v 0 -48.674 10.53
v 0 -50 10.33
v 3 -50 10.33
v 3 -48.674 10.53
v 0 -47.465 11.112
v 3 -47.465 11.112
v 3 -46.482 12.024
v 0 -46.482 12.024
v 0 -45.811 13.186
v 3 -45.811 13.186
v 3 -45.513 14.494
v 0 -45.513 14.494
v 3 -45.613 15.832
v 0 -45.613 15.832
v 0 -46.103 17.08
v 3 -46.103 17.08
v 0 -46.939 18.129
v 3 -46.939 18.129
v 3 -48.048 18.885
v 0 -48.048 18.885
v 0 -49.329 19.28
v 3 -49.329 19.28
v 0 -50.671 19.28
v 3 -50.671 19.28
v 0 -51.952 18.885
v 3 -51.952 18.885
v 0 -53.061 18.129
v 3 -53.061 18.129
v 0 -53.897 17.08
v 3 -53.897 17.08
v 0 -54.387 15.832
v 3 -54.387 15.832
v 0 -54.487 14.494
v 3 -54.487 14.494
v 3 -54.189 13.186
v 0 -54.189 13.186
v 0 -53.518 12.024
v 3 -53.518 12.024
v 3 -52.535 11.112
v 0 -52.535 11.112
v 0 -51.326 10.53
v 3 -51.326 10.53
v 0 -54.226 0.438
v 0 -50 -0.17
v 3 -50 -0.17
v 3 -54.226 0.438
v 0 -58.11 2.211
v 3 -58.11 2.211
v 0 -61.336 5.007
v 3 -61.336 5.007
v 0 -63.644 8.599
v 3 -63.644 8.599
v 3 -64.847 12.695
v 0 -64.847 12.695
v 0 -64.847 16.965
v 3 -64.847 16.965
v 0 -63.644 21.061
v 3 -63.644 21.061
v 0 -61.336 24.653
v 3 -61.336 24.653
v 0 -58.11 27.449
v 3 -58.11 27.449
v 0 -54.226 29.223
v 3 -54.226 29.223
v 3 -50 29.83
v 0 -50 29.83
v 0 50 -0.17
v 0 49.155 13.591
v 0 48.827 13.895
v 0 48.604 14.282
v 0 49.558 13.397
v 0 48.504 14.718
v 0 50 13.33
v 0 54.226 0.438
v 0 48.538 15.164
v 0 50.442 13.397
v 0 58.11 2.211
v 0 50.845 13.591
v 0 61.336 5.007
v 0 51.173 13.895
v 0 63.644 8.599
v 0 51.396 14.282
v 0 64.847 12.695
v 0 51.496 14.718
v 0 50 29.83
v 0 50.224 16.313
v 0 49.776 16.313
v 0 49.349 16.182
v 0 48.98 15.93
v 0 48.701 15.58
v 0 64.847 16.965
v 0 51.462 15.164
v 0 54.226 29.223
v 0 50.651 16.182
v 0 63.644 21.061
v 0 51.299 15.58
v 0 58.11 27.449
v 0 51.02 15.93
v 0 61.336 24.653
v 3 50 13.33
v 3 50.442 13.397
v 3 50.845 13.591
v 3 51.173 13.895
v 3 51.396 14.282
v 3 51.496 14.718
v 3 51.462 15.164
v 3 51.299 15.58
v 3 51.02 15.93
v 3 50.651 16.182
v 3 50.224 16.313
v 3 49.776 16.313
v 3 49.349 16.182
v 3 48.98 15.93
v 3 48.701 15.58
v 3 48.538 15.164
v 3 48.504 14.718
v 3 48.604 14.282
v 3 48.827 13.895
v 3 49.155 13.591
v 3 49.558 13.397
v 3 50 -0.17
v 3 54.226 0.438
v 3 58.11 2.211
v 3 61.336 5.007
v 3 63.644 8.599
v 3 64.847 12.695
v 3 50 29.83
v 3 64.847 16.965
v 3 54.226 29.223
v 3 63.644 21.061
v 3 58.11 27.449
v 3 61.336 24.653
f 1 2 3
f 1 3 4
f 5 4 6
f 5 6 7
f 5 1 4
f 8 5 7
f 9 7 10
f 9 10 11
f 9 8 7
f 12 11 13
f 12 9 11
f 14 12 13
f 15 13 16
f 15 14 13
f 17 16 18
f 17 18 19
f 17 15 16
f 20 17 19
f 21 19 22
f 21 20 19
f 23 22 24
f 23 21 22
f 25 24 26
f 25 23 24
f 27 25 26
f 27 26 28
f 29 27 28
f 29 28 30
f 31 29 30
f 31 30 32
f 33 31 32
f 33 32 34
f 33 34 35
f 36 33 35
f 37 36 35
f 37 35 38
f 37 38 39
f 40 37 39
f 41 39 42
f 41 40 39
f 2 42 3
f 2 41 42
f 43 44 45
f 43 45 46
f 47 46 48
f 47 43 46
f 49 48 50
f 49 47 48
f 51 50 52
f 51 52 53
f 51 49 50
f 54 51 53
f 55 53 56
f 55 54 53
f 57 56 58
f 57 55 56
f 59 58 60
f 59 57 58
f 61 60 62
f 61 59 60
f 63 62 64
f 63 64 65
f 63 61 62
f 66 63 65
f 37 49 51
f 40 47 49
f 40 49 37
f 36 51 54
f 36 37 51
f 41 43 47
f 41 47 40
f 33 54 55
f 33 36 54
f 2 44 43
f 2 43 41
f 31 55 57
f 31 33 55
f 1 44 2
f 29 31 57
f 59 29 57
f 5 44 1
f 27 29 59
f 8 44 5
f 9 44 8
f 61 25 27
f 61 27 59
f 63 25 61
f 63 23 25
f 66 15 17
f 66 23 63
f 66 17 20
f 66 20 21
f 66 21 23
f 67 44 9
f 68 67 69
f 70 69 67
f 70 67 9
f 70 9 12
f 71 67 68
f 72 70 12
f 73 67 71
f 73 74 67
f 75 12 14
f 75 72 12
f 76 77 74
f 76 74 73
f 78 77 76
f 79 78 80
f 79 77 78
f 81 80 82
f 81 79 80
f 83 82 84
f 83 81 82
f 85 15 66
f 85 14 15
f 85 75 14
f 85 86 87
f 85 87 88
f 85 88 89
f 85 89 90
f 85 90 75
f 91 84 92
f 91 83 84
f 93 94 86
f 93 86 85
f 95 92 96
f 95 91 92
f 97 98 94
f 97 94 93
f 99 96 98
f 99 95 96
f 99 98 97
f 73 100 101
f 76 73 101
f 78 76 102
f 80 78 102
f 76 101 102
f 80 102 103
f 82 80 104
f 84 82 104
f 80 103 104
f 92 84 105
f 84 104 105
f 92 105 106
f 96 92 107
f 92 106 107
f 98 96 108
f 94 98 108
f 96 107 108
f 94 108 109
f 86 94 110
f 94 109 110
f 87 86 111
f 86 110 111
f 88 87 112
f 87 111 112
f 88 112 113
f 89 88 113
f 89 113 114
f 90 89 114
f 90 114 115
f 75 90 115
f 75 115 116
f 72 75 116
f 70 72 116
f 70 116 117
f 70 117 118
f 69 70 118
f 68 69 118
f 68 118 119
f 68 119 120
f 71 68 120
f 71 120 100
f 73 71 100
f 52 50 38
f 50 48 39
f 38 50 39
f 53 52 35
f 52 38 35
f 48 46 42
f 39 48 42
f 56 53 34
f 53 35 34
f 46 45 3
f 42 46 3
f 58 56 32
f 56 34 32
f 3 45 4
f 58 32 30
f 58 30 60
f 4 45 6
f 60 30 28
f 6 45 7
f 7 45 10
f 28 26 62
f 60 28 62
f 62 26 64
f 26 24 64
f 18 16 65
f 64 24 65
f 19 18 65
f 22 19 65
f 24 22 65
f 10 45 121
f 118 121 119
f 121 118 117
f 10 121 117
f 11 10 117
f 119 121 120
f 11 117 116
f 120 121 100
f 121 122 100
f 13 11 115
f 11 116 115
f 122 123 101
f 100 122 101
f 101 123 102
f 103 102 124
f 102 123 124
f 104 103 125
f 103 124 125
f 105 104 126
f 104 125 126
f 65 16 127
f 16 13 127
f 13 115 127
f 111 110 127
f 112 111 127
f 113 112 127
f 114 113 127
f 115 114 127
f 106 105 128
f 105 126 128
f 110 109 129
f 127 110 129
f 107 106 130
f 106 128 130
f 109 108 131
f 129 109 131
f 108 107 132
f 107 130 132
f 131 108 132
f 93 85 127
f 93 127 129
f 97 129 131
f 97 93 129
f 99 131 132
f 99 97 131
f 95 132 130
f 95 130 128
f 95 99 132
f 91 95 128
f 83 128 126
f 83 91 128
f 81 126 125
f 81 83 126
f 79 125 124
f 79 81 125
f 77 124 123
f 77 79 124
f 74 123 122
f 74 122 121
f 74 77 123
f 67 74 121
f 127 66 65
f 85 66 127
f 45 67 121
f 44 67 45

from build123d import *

# Parameters (mm, degrees)
SKETCH1_R           = 4.5
BOSS_EXTRUDE1_DEPTH = 3
SKETCH3_R           = 1.5
CUT_EXTRUDE1_DEPTH  = 10


with BuildPart() as part:
    # Sketch1 → Boss-Extrude1 (new body)
    with BuildSketch(Plane(origin=(0, 0, 0), x_dir=(0, 0, -1), z_dir=(1, 0, 0))):
        with BuildLine():
            Line((0.169822647, 50), (0.169822647, -50))
            ThreePointArc((0.169822647, -50), (-14.830177353, -65), (-29.830177353, -50))
            Line((-29.830177353, -50), (-29.830177353, 50))
            ThreePointArc((-29.830177353, 50), (-14.830177353, 65), (0.169822647, 50))
        make_face()
        with Locations((-14.830177353, -50)):
            Circle(SKETCH1_R, mode=Mode.SUBTRACT)
    extrude(amount=BOSS_EXTRUDE1_DEPTH)

    # Sketch3 → Cut-Extrude1 (cut)
    with BuildSketch(Plane(origin=(3, 0, 0), x_dir=(0, 0, -1), z_dir=(1, 0, 0))):
        with Locations((-14.830177353, 50)):
            Circle(SKETCH3_R)
    extrude(amount=-CUT_EXTRUDE1_DEPTH, mode=Mode.SUBTRACT)


solid = part.part
